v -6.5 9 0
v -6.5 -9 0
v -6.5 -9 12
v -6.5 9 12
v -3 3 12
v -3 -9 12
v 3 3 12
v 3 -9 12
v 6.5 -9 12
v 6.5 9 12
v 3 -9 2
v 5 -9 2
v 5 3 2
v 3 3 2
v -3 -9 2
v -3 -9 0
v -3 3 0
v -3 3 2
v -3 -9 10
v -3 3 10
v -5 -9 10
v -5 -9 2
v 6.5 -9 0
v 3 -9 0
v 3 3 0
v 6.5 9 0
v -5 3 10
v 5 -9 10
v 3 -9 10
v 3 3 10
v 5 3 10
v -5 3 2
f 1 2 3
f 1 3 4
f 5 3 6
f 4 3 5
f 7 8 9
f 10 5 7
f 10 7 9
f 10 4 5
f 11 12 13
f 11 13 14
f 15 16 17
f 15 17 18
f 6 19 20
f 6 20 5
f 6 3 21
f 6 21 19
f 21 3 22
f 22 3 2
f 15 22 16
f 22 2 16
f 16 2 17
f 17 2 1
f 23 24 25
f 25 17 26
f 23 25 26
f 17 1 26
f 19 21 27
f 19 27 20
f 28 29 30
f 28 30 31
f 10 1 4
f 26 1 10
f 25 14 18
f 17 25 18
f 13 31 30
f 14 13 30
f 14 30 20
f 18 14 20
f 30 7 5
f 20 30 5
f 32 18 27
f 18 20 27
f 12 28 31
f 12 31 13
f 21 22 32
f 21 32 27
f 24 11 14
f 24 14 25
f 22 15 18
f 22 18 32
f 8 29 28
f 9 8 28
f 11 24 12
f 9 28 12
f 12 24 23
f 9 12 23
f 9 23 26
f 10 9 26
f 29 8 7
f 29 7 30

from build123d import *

# Parameters (mm, degrees)
ESQUISSE1_W             = 13
ESQUISSE1_H             = 18
BOSS_EXTRU_1_DEPTH      = 12
ENL_V_MAT_EXTRU_1_DEPTH = 12


with BuildPart() as part:
    # Esquisse1 → Boss.-Extru.1 (new body)
    with BuildSketch(Plane.XY):
        Rectangle(ESQUISSE1_W, ESQUISSE1_H)
    extrude(amount=BOSS_EXTRU_1_DEPTH)

    # Esquisse2 → Enlèv. mat.-Extru.1 (cut)
    with BuildSketch(Plane.XZ.offset(9)):
        Polygon((-5, 10), (-3, 10), (-3, 12), (3, 12), (3, 10), (5, 10), (5, 2), (3, 2), (3, 0), (-3, 0), (-3, 2), (-5, 2), align=None)
    extrude(amount=-ENL_V_MAT_EXTRU_1_DEPTH, mode=Mode.SUBTRACT)


solid = part.part
